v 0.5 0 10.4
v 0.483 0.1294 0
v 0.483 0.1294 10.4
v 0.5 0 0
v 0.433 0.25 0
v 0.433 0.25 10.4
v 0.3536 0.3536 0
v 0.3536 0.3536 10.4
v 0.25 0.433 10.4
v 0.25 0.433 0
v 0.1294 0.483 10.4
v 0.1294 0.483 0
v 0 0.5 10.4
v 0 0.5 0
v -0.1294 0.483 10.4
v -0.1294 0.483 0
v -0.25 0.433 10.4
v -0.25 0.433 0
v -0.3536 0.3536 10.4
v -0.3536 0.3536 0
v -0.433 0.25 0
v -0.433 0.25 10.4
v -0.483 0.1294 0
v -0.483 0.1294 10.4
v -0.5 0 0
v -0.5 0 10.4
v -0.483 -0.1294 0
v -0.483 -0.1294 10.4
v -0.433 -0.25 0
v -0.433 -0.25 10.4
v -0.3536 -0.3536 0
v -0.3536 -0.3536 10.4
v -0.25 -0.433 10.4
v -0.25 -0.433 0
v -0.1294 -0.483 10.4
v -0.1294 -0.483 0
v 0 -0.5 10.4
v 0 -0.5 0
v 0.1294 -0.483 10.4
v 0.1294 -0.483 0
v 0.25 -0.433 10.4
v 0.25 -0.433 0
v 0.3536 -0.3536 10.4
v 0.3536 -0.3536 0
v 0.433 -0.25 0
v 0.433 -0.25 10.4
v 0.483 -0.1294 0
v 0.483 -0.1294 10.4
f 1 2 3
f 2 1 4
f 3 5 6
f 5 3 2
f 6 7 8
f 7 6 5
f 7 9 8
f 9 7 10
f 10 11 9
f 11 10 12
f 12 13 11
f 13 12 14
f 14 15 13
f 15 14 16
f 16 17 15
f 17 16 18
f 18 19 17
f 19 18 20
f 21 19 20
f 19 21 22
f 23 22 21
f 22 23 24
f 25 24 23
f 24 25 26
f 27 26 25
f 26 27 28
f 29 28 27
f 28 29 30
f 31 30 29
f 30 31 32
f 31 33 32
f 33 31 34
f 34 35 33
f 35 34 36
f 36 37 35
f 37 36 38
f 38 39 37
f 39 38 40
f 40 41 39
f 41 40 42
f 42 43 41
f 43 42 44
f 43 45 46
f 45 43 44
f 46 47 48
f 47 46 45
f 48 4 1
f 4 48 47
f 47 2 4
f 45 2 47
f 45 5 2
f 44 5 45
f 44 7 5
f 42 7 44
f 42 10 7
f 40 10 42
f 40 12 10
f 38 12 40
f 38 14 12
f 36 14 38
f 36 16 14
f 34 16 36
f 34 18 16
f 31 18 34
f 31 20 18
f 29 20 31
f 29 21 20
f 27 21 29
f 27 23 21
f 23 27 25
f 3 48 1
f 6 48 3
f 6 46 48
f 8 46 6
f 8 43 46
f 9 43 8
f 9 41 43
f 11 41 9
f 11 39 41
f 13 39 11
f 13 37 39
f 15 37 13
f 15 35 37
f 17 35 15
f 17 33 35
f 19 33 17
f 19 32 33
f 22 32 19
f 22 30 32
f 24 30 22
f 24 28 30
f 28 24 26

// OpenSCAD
// part_id: mar16
// name: Mars pointer orb rod small
// source_drawing_ids: DRW-013
// units: mm
// revision: 0.1
// SPDX-License-Identifier: MIT

module part_mar16(d = 1.0, h = 10.4) {
    cylinder(d = d, h = h, center = false, $fn = 24);
}

// ---- "main guard" ----
if (is_undef(__LIB_MODE__)) {
    part_mar16();
}
